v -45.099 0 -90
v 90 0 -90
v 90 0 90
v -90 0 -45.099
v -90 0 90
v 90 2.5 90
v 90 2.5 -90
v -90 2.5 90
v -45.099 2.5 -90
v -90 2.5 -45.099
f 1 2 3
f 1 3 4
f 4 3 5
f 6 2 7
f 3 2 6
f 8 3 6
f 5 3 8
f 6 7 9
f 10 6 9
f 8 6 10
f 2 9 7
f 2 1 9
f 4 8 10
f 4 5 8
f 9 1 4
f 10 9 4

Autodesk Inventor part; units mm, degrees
ref_plane "YZ Plane" through (0, 0, 0) normal (1, 0, 0) x (0, 1, 0)
ref_plane "XZ Plane" through (0, 0, 0) normal (0, 1, 0) x (-1, 0, 0)
ref_plane "XY Plane" through (0, 0, 0) normal (0, 0, 1) x (1, 0, 0)
sketch "Sketch1" plane through (0, 0, 0) normal (0, 1, 0) x (-1, 0, 0)
  line L0 (-90, 90) -> (90, 90)
  line L1 (90, 90) -> (90, -90)
  line L2 (90, -90) -> (-90, -90)
  line L3 (-90, -90) -> (-90, 90)
  line L4 (45.0987, -90) -> (90, -45.0987)
  line L5 (45.0987, -90) -> (108.5987, -90) construction
  point P0 (0, 0)
  point P1 (-90.1, 76.6)
  dimension "d3" = 90
  dimension "d4" = 90
  dimension "d5" = 90
  dimension "d6" = 90
  dimension "d7" = 45
  dimension "d8" = 31.75
  dimension "d9" = 180
extrude "Extrusion1" add sketch "Sketch1" along normal blind 2.5 contours L0 L1 L4 L2 L3
properties part number "Lid_Clear_Model"
